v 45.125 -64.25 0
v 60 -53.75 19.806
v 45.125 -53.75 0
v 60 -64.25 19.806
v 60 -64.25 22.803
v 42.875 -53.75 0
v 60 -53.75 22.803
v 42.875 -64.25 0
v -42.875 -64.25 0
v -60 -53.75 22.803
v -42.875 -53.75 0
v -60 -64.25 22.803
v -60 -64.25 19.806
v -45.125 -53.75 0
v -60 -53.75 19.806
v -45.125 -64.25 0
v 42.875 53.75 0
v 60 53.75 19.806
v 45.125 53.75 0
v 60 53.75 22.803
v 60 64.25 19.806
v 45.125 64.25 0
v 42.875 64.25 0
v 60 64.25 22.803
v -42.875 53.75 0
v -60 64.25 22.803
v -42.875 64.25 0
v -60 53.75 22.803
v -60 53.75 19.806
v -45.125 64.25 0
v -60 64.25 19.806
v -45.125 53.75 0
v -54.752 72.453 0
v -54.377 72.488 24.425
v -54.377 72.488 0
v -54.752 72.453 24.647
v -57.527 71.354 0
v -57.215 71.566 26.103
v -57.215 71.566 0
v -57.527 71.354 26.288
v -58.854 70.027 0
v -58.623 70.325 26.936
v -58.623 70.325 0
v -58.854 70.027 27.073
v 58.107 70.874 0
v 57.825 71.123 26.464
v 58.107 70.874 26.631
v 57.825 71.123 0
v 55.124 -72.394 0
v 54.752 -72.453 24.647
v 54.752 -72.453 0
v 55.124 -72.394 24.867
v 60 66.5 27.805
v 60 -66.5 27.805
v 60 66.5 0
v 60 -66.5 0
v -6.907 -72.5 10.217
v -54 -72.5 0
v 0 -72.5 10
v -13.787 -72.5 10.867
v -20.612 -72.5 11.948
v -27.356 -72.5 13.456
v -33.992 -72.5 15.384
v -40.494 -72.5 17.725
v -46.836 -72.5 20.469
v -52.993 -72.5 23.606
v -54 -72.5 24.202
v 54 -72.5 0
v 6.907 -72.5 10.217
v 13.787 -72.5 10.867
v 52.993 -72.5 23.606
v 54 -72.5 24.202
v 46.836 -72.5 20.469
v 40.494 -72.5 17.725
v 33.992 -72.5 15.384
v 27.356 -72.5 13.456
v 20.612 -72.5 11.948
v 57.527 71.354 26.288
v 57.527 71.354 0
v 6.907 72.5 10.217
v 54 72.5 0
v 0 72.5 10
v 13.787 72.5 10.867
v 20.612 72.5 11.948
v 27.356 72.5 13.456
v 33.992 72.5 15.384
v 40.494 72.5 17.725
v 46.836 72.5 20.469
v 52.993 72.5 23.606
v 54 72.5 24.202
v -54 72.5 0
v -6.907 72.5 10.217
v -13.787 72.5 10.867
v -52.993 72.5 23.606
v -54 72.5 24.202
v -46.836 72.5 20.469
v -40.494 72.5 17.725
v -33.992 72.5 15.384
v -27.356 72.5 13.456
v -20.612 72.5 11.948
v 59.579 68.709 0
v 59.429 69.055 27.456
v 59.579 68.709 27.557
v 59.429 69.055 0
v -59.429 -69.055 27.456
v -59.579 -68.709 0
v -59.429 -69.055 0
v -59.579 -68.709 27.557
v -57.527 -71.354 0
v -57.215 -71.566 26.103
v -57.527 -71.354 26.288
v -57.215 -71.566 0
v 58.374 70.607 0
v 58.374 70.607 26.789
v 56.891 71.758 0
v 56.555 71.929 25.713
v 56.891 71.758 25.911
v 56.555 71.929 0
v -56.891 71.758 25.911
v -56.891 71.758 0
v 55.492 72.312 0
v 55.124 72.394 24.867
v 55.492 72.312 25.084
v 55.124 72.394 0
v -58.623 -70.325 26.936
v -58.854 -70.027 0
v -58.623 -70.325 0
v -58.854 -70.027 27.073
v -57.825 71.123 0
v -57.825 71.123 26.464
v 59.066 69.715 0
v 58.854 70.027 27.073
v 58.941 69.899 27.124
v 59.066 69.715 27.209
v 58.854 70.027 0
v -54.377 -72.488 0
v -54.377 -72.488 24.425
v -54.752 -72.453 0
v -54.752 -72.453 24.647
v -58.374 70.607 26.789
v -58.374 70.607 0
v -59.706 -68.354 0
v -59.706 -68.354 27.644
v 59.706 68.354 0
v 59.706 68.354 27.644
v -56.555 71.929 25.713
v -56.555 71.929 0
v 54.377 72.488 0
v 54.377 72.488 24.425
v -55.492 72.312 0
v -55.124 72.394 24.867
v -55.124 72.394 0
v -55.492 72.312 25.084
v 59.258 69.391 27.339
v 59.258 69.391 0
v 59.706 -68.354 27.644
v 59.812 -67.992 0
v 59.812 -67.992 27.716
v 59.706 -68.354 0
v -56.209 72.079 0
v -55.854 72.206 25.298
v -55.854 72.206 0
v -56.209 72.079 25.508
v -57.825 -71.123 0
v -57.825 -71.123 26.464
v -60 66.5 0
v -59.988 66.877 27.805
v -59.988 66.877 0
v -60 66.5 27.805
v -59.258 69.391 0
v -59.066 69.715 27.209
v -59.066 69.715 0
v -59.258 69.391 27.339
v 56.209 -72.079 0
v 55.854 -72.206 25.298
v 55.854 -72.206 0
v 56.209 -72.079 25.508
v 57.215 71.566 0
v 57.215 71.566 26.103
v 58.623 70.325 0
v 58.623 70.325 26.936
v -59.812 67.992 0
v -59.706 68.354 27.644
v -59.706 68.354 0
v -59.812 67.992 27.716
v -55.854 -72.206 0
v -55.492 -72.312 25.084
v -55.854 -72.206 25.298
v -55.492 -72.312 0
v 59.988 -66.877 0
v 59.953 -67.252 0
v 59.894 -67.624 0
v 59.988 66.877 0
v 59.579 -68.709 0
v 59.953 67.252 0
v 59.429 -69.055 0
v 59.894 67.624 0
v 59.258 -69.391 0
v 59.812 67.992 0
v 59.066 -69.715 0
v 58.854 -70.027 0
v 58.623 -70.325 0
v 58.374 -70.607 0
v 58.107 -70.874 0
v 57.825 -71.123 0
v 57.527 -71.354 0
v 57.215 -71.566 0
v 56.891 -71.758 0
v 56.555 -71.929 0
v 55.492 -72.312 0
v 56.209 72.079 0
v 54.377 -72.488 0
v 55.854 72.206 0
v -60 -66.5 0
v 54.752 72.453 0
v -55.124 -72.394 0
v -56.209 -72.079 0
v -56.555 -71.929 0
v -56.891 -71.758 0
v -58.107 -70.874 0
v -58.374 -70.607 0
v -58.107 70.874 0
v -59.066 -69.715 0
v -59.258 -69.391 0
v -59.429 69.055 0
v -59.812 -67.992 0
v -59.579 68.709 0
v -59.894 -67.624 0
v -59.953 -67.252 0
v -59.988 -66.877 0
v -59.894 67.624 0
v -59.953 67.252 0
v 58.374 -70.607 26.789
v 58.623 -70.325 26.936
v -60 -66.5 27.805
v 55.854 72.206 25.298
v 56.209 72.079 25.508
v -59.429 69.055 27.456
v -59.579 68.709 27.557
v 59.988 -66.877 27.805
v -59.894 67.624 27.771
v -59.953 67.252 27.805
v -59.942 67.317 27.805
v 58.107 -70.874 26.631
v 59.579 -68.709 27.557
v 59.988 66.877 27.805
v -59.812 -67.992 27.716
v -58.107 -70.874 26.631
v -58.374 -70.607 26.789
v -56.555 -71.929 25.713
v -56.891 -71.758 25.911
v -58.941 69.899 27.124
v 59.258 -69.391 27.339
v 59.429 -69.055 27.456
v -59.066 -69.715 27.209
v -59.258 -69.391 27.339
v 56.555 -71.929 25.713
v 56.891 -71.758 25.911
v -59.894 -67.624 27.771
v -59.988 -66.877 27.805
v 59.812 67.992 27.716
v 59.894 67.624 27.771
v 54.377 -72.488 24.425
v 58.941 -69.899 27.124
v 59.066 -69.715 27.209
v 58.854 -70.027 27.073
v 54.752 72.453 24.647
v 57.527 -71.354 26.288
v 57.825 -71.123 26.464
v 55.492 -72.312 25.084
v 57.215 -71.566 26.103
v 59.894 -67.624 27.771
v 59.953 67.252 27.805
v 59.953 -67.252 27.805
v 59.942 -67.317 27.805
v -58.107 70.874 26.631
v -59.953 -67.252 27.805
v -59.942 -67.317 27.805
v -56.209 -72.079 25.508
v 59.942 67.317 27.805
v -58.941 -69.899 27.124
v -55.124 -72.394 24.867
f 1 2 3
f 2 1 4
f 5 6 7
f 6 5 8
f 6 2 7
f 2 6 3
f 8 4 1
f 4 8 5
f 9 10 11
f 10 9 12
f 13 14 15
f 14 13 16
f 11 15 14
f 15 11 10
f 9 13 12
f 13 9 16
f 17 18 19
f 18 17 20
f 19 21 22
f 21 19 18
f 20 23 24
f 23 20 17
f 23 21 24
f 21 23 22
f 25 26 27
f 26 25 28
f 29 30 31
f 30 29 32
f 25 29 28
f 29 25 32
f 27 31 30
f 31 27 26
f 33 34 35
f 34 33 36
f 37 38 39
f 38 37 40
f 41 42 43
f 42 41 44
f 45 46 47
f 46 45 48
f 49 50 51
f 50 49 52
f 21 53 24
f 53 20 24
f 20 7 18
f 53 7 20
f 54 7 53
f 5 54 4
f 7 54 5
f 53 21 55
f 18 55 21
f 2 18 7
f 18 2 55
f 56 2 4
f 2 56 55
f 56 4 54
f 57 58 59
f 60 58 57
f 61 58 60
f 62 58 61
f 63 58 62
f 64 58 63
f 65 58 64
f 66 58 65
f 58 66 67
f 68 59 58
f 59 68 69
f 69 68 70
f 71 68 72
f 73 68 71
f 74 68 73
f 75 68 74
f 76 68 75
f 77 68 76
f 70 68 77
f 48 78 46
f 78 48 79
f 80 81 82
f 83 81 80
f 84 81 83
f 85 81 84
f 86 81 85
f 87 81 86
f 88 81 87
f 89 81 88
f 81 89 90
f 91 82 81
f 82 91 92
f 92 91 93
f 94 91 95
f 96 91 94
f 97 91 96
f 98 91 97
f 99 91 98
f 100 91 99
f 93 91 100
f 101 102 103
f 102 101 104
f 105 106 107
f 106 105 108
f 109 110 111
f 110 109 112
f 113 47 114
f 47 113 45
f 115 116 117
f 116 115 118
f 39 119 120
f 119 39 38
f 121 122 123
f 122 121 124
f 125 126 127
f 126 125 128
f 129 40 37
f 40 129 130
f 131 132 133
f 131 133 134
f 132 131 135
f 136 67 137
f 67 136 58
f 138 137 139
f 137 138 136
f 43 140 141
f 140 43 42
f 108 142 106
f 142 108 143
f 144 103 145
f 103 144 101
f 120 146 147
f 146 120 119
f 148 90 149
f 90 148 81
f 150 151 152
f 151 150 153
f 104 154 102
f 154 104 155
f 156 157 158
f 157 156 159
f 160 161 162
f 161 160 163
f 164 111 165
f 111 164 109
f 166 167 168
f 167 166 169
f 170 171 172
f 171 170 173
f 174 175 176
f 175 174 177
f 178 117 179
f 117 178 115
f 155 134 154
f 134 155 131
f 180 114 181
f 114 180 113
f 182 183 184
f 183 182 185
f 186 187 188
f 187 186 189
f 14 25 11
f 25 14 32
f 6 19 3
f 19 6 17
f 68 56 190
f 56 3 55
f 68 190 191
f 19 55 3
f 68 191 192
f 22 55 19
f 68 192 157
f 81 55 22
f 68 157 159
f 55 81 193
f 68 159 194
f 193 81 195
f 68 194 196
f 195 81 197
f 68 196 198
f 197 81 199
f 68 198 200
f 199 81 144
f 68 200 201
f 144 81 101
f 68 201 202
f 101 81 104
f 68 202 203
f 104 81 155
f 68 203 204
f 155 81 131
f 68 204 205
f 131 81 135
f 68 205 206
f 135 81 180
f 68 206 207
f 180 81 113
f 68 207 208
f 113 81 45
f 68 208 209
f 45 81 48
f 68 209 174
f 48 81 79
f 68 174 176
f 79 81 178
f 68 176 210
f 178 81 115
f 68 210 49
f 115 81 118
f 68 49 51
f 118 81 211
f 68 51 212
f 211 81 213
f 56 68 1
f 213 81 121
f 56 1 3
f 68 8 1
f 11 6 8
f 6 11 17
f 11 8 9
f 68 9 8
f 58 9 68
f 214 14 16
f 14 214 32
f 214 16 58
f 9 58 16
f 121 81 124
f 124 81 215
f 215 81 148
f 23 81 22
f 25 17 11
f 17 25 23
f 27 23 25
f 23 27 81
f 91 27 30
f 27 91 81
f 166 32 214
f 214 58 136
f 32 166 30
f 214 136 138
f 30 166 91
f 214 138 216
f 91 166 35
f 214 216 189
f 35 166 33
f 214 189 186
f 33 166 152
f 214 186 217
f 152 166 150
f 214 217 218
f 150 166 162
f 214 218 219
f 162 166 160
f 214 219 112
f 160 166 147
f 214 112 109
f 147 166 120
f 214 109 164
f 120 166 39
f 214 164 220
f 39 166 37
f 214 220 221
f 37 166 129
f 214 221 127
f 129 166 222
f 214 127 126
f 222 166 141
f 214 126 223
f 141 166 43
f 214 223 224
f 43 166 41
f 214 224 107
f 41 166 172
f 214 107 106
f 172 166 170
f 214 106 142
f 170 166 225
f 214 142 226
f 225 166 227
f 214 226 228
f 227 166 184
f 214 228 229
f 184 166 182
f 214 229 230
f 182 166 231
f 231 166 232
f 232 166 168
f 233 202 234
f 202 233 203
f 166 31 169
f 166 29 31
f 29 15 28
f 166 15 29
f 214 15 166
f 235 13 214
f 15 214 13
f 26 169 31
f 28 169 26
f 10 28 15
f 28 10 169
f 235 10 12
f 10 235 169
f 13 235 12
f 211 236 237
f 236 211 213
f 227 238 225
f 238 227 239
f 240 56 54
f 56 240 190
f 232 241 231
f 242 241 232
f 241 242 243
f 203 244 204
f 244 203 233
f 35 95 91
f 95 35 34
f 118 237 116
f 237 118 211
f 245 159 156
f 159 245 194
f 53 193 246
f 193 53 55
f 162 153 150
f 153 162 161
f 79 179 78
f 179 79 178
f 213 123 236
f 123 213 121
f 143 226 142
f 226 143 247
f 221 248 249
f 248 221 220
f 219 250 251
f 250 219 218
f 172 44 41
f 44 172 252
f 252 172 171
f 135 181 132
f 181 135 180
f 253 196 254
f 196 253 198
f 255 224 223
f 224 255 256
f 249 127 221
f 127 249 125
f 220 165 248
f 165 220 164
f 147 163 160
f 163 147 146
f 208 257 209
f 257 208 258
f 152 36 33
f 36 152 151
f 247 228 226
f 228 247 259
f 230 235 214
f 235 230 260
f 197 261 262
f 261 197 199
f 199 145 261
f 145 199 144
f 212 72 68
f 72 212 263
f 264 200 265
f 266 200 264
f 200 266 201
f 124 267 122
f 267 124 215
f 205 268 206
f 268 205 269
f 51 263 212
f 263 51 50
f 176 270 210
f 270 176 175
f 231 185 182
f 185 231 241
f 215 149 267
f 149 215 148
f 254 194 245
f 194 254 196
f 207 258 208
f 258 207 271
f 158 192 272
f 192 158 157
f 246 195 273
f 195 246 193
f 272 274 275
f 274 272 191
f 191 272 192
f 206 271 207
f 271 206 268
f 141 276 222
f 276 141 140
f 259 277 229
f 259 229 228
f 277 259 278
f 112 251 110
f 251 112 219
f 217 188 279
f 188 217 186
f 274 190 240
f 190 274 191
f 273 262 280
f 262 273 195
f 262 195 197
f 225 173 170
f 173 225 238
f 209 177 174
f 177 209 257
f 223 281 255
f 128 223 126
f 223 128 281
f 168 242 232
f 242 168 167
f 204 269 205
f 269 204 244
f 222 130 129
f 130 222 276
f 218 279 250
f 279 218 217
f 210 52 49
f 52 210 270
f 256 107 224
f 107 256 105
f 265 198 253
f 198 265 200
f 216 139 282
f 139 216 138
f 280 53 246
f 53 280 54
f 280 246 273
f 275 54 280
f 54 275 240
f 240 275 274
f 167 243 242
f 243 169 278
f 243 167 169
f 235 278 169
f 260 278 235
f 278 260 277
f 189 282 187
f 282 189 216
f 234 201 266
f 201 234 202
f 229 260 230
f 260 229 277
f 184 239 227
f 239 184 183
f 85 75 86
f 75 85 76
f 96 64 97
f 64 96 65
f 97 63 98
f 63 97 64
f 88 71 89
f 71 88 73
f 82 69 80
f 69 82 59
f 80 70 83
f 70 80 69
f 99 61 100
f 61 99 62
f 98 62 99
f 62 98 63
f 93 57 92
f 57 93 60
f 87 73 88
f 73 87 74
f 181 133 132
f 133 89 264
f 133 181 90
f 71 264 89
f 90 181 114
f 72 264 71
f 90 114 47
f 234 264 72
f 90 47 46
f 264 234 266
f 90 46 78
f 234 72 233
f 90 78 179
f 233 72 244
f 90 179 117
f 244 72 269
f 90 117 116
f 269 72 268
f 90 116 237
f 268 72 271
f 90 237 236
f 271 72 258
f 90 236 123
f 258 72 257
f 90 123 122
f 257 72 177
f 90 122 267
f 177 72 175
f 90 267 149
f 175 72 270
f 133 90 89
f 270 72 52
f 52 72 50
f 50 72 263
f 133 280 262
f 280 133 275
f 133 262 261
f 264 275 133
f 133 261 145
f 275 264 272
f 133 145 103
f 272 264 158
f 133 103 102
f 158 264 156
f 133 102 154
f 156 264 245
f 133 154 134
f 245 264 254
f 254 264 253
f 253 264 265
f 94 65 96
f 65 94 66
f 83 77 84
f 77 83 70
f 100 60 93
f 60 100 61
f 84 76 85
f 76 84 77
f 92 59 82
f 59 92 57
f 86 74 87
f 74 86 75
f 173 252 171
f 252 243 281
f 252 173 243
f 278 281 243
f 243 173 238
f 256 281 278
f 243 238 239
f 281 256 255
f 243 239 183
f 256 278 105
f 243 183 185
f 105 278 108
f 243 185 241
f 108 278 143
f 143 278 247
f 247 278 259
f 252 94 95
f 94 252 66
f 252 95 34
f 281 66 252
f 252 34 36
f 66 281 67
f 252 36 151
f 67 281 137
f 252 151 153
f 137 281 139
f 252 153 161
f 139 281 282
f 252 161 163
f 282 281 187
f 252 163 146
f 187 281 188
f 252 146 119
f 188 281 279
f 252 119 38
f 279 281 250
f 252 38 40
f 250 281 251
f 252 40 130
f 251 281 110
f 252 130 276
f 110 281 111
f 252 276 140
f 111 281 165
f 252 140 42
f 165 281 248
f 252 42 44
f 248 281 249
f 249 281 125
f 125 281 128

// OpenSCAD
// =========================================================================
// DESIGN: Parametric Round-to-Flat Adapter Plate
// FILE: Round-to-Flat.scad
// VERSION: v0.12
// DATE: 2026-06-30
// AUTHOR: Zed Coding Agent
// DESCRIPTION:
//   An elegant, fully parametric OpenSCAD adapter plate designed to bridge
//   the curved surface of a round mast (default 220mm diameter) and a
//   flat-backed plate (default 100x150mm with 20mm corner radiuses).
//
//   Includes options for:
//   - Configurable mast diameter and orientation (parallel to X or Y axis).
//   - Parametric flat plate dimensions and corner roundedness.
//   - Custom flat-plate mounting holes with round or hex pockets (for nuts/bolt heads).
//   - Built-in curved hose clamp/steel banding slots for securing the adapter to the mast.
//   - Auto-visualizer for inspection of the complete assembly.
//
// PRINTING TIPS:
//   - Material: PETG, ASA, or ABS are highly recommended for outdoor mast installations
//     due to UV resistance and temperature stability.
//   - Orientation:
//     1. Flat on Bed (Default): Easy to print, minimal support required, great for
//        the flat plate mounting surface. The hose clamp slots will print as small bridges.
//     2. On Side (Y-Z or X-Z plane): Maximum layer-bonding strength against clamp tension.
//        Requires a brim or supports depending on the orientation, but yields high accuracy
//        for the curved contact surfaces.
//   - Infill: 30% - 50% Gyroid or Grid infill with 4+ walls for structural strength.
// =========================================================================

/* [Mast Parameters] */
// Diameter of the round metal mast (default: 220mm)
mast_diameter = 220; // [50:500]

// Orientation of the mast axis relative to the adapter plate
mast_axis = "Y"; // ["X", "Y"]

/* [Flat Plate Parameters] */
// Width of the flat plate (X axis)
flat_width = 120; // [20:300]

// Length of the flat plate (Y axis)
flat_length = 145; // [20:450]

// Corner radius of the flat plate (default: 20mm)
flat_corner_radius = 6; // [0:100]

/* [Adapter Thickness Parameters] */
// Minimum solid material thickness of the adapter at its thinnest point (default: 10mm)
min_thickness = 10; // [4:40]

/* [Metal Plate Recess Parameters] */
// Enable a recessed captive pocket on the flat side to hold the metal plate
recess_enabled = false;

// Thickness of the metal plate (depth of the recess pocket)
recess_depth = 2.5;

// Tolerance/clearance around the metal plate edges for an easy fit
recess_clearance = 0.3;

// Outer wall thickness around the recessed pocket (set to 0 for a simple flat mount with no captive pocket)
recess_wall_thickness = 3;

/* [Mounting Holes (Flat Plate to Adapter)] */
// Enable mounting holes for attaching the flat plate
mount_holes_enabled = false;

// Diameter of the mounting screws (e.g., 5.5 for M5 clearance)
mount_hole_diameter = 8.5;

// Distance between mounting holes along the X axis (concentric with 20mm corners: 100 - 2*20 = 60)
mount_hole_spacing_x = 88;

// Distance between mounting holes along the Y axis (concentric with 20mm corners: 150 - 2*20 = 110)
mount_hole_spacing_y = 118;

// Remaining material thickness for bolt heads or nuts to clamp against (flat shoulder)
bolt_clamp_thickness = 5;

// Enable hex/round recess pockets on the curved mast side (prevents screws from touching the mast)
pocket_enabled = true;

// Shape of the recessed pockets
pocket_shape = "hex"; // ["round", "hex"]

// Size of the pocket (diameter for round, flat-to-flat width of 13.0mm for M8 hex + 0.6mm tolerance = 13.6mm)
pocket_size = 13.6;

/* [Hose Clamp Slots (Adapter to Mast)] */
// Enable slots for steel hose clamps or banding
clamp_slots_enabled = true;

// Route the clamp bands through the flat plate holes (enter flat face, exit sides!)
clamp_through_holes_enabled = true;

// Width of the hose clamp band slot (along the Y/X axis)
clamp_width = 9;

// Thickness of the hose clamp band slot (radial clearance)
clamp_thickness = 0.6;

// Remaining wall thickness between the slot ceiling and the flat plate face (default: 3mm)
// Lower values make the plastic under the mast thicker and stronger, but the slot will open on the flat side in the center.
clamp_ceiling_margin = 3; // [0.5:15]

// Automatically calculate clamp_offset to make the plastic under the mast as thick as possible.
// If clamp_ceiling_margin is small, the slot will naturally open on the flat side in the center.
clamp_offset = min_thickness + clamp_thickness/2 - clamp_ceiling_margin;

// Positions of the clamp slots along the mast axis relative to center
clamp_positions = [-40, 40];

/* [Design Precision] */
// Curve resolution (higher = smoother, but slower rendering)
precision = 100; // [30:200]

/* [Visualization Options] */
// Show translucent mast and flat plate in preview (automatically hidden in STL renders)
show_visualization = true;


// =========================================================================
// INTERNAL GEOMETRICAL CALCULATIONS
// =========================================================================

$fn = precision;

// Mast radius
R_mast = mast_diameter / 2;

// Depth of the recess if enabled
r_depth = (recess_enabled && recess_depth > 0) ? recess_depth : 0;

// Sizing of the outer adapter plate based on the recess settings
adapter_width = flat_width + (recess_enabled ? 2 * (recess_clearance + recess_wall_thickness) : 0);
adapter_length = flat_length + (recess_enabled ? 2 * (recess_clearance + recess_wall_thickness) : 0);
adapter_corner_radius = flat_corner_radius + (recess_enabled ? (recess_clearance + recess_wall_thickness) : 0);

// Chord width is the width of the adapter perpendicular to the mast axis
chord_width = (mast_axis == "Y") ? adapter_width : adapter_length;

// Sagitta is the depth of the circular arc carved into the adapter: s = R - sqrt(R^2 - (W/2)^2)
// Safe guard prevents square root of negative numbers if flat plate is wider than the mast diameter
sagitta = (R_mast > chord_width/2) ? (R_mast - sqrt(pow(R_mast, 2) - pow(chord_width/2, 2))) : R_mast;

// The total thickness of the adapter at its thickest edge points
total_thickness = r_depth + min_thickness + sagitta;

// Determine clamp positions along the mast axis.
// If routing through plate holes, they must align exactly with the mounting holes.
clamp_positions_calculated = clamp_through_holes_enabled ? (
    (mast_axis == "Y") ? [-mount_hole_spacing_y / 2, mount_hole_spacing_y / 2] : [-mount_hole_spacing_x / 2, mount_hole_spacing_x / 2]
) : clamp_positions;


// =========================================================================
// MAIN ASSEMBLY
// =========================================================================

// Render the final adapter plate
adapter_plate();

// Render visualization objects if enabled and in preview mode
if (show_visualization && $preview) {
    visualize_assembly();
}


// =========================================================================
// MODULES & GEOMETRY
// =========================================================================

// --- Main Adapter Plate ---
module adapter_plate() {
    difference() {
        // 1. Base solid block with rounded corners
        rounded_rectangle(adapter_width, adapter_length, adapter_corner_radius, total_thickness);

        // 2. Subtract the recessed captive pocket for the flat plate (if enabled)
        if (recess_enabled && recess_depth > 0) {
            // Cut from slightly below z=0 to the recess depth to ensure clean manifold subtraction
            translate([0, 0, -0.5])
            rounded_rectangle(
                flat_width + 2 * recess_clearance,
                flat_length + 2 * recess_clearance,
                flat_corner_radius + recess_clearance,
                recess_depth + 0.5
            );
        }

        // 3. Subtract the curved mast surface
        mast_cylinder_cutout();

        // 4. Subtract mounting holes (if enabled and not using clamp routing)
        if (mount_holes_enabled && !clamp_through_holes_enabled) {
            mounting_holes_cutout();
        }

        // 5. Subtract hose clamp slots (if enabled)
        if (clamp_slots_enabled) {
            for (pos = clamp_positions_calculated) {
                if (clamp_through_holes_enabled) {
                    routed_clamp_slot(pos);
                } else {
                    clamp_slot_cutout(pos);
                }
            }
        }
    }
}

// --- Rounded Rectangle Base ---
module rounded_rectangle(w, l, r, h) {
    if (r <= 0) {
        // Fallback to a perfect rectangle if radius is 0
        translate([0, 0, h/2])
        cube([w, l, h], center = true);
    } else {
        // Clamp corner radius so it doesn't exceed half the width or length
        r_clamped = min(r, min(w/2, l/2));

        translate([0, 0, h/2])
        hull() {
            translate([-w/2 + r_clamped, -l/2 + r_clamped, 0]) cylinder(r = r_clamped, h = h, center = true);
            translate([ w/2 - r_clamped, -l/2 + r_clamped, 0]) cylinder(r = r_clamped, h = h, center = true);
            translate([-w/2 + r_clamped,  l/2 - r_clamped, 0]) cylinder(r = r_clamped, h = h, center = true);
            translate([ w/2 - r_clamped,  l/2 - r_clamped, 0]) cylinder(r = r_clamped, h = h, center = true);
        }
    }
}

// --- Mast Cylinder Cutout ---
module mast_cylinder_cutout() {
    if (mast_axis == "Y") {
        // Mast runs along the Y axis, centered at X=0, Z = r_depth + min_thickness + R_mast
        translate([0, 0, r_depth + min_thickness + R_mast])
        rotate([90, 0, 0])
        cylinder(r = R_mast, h = adapter_length + 10, center = true);
    } else {
        // Mast runs along the X axis, centered at Y=0, Z = r_depth + min_thickness + R_mast
        translate([0, 0, r_depth + min_thickness + R_mast])
        rotate([0, 90, 0])
        cylinder(r = R_mast, h = adapter_width + 10, center = true);
    }
}

// --- Hose Clamp Slot Cutout ---
module clamp_slot_cutout(pos) {
    // Radii of the curved slot
    R_slot_outer = R_mast + clamp_offset + clamp_thickness/2;
    R_slot_inner = R_mast + clamp_offset - clamp_thickness/2;

    // Check if the slot height breaches the bottom face (which is r_depth at the thinnest central part)
    // Bottom of slot at x=0 is z = r_depth + min_thickness - clamp_offset - clamp_thickness/2
    // If this is <= r_depth, the slot would open into the recess pocket!
    if (min_thickness <= (clamp_offset + clamp_thickness/2)) {
        echo("<font color='blue'><b>INFO:</b> The clamp slot is open on the flat front face in the center (optimized for maximum structural thickness).</font>");
    } else {
        echo("<font color='green'><b>INFO:</b> The clamp slot is fully enclosed inside the adapter body.</font>");
    }

    difference() {
        // Full curved slot
        if (mast_axis == "Y") {
            // Slot is perpendicular to the Y axis (wraps around Y-mast in X-Z plane)
            translate([0, pos, r_depth + min_thickness + R_mast])
            rotate([90, 0, 0])
            difference() {
                cylinder(r = R_slot_outer, h = clamp_width, center = true);
                // Extra length in Z to ensure clean subtraction
                cylinder(r = R_slot_inner, h = clamp_width + 2, center = true);
            }
        } else {
            // Slot is perpendicular to the X axis (wraps around X-mast in Y-Z plane)
            translate([pos, 0, r_depth + min_thickness + R_mast])
            rotate([0, 90, 0])
            difference() {
                cylinder(r = R_slot_outer, h = clamp_width, center = true);
                cylinder(r = R_slot_inner, h = clamp_width + 2, center = true);
            }
        }

        // If routing through holes, subtract the center section so the slot doesn't exist between the holes
        if (clamp_through_holes_enabled) {
            // Subtract a box covering the center portion
            // We leave an overlap of 5mm past the hole centers to make threading easier
            overlap = 5;
            center_w = (mast_axis == "Y") ?
                (mount_hole_spacing_x - 2 * overlap) :
                (mount_hole_spacing_y - 2 * overlap);

            if (mast_axis == "Y") {
                translate([0, pos, total_thickness/2])
                cube([center_w, clamp_width + 2, total_thickness + 2], center = true);
            } else {
                translate([pos, 0, total_thickness/2])
                cube([clamp_width + 2, center_w, total_thickness + 2], center = true);
            }
        }
    }
}

// --- Routed Clamp Slot (Straight Diagonal) ---
module routed_clamp_slot(pos) {
    hole_dist = (mast_axis == "Y") ? abs(mount_hole_spacing_x / 2) : abs(mount_hole_spacing_y / 2);
    block_dist = (mast_axis == "Y") ? (adapter_width / 2) : (adapter_length / 2);

    // In OpenSCAD coordinate space for this model:
    // Z = 0 is the FLAT face (underneath the metal plate).
    // Z = total_thickness is the CURVED face (against the mast).
    // We want the tunnel to go from the flat face (Z=0) at the hole position,
    // to the vertical side face of the block, exiting near the curved back.
    Z_side = total_thickness - clamp_width/2 - 2;

    w = clamp_width + 1.5;
    t = clamp_thickness + 1.2;

    module cut_shape() {
        if (mast_axis == "Y") {
            rotate([90, 0, 0]) cylinder(d=t, h=w, center=true);
        } else {
            rotate([0, 90, 0]) cylinder(d=t, h=w, center=true);
        }
    }

    module single_tunnel(is_right) {
        sign = is_right ? 1 : -1;

        dx = block_dist - hole_dist;
        dz = Z_side - 0;

        // Normalize vector
        len = sqrt(dx*dx + dz*dz);
        dir_x = dx / len;
        dir_z = dz / len;

        // Extend to ensure clean cuts through the faces
        ext_hole_x = hole_dist - dir_x * 5;
        ext_hole_z = 0 - dir_z * 5;

        ext_side_x = block_dist + dir_x * 5;
        ext_side_z = Z_side + dir_z * 5;

        hull() {
            if (mast_axis == "Y") {
                translate([sign * ext_hole_x, 0, ext_hole_z]) cut_shape();
                translate([sign * ext_side_x, 0, ext_side_z]) cut_shape();
            } else {
                translate([0, sign * ext_hole_x, ext_hole_z]) cut_shape();
                translate([0, sign * ext_side_x, ext_side_z]) cut_shape();
            }
        }
    }

    if (mast_axis == "Y") {
        translate([0, pos, 0]) {
            single_tunnel(true);
            single_tunnel(false);
        }
    } else {
        translate([pos, 0, 0]) {
            single_tunnel(true);
            single_tunnel(false);
        }
    }
}

// --- Mounting Holes and Pockets ---
module mounting_holes_cutout() {
    x_positions = [-mount_hole_spacing_x / 2, mount_hole_spacing_x / 2];
    y_positions = [-mount_hole_spacing_y / 2, mount_hole_spacing_y / 2];

    // Compute local thickness at the mounting hole location to clamp the pocket depth safely
    hole_dist = (mast_axis == "Y") ? abs(mount_hole_spacing_x / 2) : abs(mount_hole_spacing_y / 2);
    local_thick = (R_mast > hole_dist) ?
        (min_thickness + R_mast - sqrt(pow(R_mast, 2) - pow(hole_dist, 2))) :
        min_thickness;

    // Ensure we leave at least 2.5mm of physical material for the screw shoulder to clamp against
    clamped_clamp_thickness = r_depth + max(2.5, min(bolt_clamp_thickness, local_thick - 2.5));

    for (x = x_positions) {
        for (y = y_positions) {
            // 1. Through-hole for screw shank (runs through entire adapter thickness)
            translate([x, y, -1])
            cylinder(d = mount_hole_diameter, h = total_thickness + 2);

            // 2. Nut/Bolt pocket on the curved mast side
            if (pocket_enabled) {
                // Starts at clamped_clamp_thickness and cuts up through the curved surface
                translate([x, y, clamped_clamp_thickness])
                pocket_volume(pocket_size, total_thickness - clamped_clamp_thickness + 1, pocket_shape);
            }
        }
    }
}

// --- Bolt/Nut Pocket Volume Helper ---
module pocket_volume(size, depth, shape) {
    if (shape == "hex") {
        // In OpenSCAD, a cylinder with $fn=6 is sized by outer radius (corner-to-center).
        // Flat-to-flat width (size) requires: Radius = size / sqrt(3)
        rotate([0, 0, 30]) // Align flat edge of hex parallel to plate edge
        cylinder(r = size / sqrt(3), h = depth, $fn = 6);
    } else {
        // Default to circular pocket
        cylinder(d = size, h = depth);
    }
}


// =========================================================================
// VISUALIZATION MODULE (PREVIEW ONLY)
// =========================================================================

module visualize_assembly() {
    // 1. Render Mast (Translucent Steel Blue)
    color([0.65, 0.72, 0.8, 0.35]) {
        if (mast_axis == "Y") {
            translate([0, 0, r_depth + min_thickness + R_mast])
            rotate([90, 0, 0])
            cylinder(r = R_mast, h = adapter_length + 60, center = true);
        } else {
            translate([0, 0, r_depth + min_thickness + R_mast])
            rotate([0, 90, 0])
            cylinder(r = R_mast, h = adapter_width + 60, center = true);
        }
    }

    // 2. Render Mock Flat Metal Plate (Translucent Orange)
    color([1.0, 0.45, 0.1, 0.5]) {
        // If recess is enabled, plate sits inside the pocket. If disabled, it sits below with a 2mm assembly gap.
        z_plate = recess_enabled ? 0.05 : -recess_depth - 2;
        h_plate = recess_enabled ? recess_depth - 0.05 : recess_depth;

        translate([0, 0, z_plate])
        difference() {
            // Footprint matching the requested flat plate
            rounded_rectangle(flat_width, flat_length, flat_corner_radius, h_plate);

            // Subtract holes to verify alignment visually
            if (mount_holes_enabled || clamp_through_holes_enabled) {
                x_positions = [-mount_hole_spacing_x / 2, mount_hole_spacing_x / 2];
                y_positions = [-mount_hole_spacing_y / 2, mount_hole_spacing_y / 2];
                for (x = x_positions) {
                    for (y = y_positions) {
                        if (clamp_through_holes_enabled) {
                            // Render matching rectangular slots on the flat plate
                            translate([x, y, h_plate/2])
                            if (mast_axis == "Y") {
                                cube([clamp_thickness + 1.2, clamp_width + 1.5, h_plate + 2], center = true);
                            } else {
                                cube([clamp_width + 1.5, clamp_thickness + 1.2, h_plate + 2], center = true);
                            }
                        } else {
                            translate([x, y, -1])
                            cylinder(d = mount_hole_diameter, h = h_plate + 2);
                        }
                    }
                }
            }
        }
    }
}
